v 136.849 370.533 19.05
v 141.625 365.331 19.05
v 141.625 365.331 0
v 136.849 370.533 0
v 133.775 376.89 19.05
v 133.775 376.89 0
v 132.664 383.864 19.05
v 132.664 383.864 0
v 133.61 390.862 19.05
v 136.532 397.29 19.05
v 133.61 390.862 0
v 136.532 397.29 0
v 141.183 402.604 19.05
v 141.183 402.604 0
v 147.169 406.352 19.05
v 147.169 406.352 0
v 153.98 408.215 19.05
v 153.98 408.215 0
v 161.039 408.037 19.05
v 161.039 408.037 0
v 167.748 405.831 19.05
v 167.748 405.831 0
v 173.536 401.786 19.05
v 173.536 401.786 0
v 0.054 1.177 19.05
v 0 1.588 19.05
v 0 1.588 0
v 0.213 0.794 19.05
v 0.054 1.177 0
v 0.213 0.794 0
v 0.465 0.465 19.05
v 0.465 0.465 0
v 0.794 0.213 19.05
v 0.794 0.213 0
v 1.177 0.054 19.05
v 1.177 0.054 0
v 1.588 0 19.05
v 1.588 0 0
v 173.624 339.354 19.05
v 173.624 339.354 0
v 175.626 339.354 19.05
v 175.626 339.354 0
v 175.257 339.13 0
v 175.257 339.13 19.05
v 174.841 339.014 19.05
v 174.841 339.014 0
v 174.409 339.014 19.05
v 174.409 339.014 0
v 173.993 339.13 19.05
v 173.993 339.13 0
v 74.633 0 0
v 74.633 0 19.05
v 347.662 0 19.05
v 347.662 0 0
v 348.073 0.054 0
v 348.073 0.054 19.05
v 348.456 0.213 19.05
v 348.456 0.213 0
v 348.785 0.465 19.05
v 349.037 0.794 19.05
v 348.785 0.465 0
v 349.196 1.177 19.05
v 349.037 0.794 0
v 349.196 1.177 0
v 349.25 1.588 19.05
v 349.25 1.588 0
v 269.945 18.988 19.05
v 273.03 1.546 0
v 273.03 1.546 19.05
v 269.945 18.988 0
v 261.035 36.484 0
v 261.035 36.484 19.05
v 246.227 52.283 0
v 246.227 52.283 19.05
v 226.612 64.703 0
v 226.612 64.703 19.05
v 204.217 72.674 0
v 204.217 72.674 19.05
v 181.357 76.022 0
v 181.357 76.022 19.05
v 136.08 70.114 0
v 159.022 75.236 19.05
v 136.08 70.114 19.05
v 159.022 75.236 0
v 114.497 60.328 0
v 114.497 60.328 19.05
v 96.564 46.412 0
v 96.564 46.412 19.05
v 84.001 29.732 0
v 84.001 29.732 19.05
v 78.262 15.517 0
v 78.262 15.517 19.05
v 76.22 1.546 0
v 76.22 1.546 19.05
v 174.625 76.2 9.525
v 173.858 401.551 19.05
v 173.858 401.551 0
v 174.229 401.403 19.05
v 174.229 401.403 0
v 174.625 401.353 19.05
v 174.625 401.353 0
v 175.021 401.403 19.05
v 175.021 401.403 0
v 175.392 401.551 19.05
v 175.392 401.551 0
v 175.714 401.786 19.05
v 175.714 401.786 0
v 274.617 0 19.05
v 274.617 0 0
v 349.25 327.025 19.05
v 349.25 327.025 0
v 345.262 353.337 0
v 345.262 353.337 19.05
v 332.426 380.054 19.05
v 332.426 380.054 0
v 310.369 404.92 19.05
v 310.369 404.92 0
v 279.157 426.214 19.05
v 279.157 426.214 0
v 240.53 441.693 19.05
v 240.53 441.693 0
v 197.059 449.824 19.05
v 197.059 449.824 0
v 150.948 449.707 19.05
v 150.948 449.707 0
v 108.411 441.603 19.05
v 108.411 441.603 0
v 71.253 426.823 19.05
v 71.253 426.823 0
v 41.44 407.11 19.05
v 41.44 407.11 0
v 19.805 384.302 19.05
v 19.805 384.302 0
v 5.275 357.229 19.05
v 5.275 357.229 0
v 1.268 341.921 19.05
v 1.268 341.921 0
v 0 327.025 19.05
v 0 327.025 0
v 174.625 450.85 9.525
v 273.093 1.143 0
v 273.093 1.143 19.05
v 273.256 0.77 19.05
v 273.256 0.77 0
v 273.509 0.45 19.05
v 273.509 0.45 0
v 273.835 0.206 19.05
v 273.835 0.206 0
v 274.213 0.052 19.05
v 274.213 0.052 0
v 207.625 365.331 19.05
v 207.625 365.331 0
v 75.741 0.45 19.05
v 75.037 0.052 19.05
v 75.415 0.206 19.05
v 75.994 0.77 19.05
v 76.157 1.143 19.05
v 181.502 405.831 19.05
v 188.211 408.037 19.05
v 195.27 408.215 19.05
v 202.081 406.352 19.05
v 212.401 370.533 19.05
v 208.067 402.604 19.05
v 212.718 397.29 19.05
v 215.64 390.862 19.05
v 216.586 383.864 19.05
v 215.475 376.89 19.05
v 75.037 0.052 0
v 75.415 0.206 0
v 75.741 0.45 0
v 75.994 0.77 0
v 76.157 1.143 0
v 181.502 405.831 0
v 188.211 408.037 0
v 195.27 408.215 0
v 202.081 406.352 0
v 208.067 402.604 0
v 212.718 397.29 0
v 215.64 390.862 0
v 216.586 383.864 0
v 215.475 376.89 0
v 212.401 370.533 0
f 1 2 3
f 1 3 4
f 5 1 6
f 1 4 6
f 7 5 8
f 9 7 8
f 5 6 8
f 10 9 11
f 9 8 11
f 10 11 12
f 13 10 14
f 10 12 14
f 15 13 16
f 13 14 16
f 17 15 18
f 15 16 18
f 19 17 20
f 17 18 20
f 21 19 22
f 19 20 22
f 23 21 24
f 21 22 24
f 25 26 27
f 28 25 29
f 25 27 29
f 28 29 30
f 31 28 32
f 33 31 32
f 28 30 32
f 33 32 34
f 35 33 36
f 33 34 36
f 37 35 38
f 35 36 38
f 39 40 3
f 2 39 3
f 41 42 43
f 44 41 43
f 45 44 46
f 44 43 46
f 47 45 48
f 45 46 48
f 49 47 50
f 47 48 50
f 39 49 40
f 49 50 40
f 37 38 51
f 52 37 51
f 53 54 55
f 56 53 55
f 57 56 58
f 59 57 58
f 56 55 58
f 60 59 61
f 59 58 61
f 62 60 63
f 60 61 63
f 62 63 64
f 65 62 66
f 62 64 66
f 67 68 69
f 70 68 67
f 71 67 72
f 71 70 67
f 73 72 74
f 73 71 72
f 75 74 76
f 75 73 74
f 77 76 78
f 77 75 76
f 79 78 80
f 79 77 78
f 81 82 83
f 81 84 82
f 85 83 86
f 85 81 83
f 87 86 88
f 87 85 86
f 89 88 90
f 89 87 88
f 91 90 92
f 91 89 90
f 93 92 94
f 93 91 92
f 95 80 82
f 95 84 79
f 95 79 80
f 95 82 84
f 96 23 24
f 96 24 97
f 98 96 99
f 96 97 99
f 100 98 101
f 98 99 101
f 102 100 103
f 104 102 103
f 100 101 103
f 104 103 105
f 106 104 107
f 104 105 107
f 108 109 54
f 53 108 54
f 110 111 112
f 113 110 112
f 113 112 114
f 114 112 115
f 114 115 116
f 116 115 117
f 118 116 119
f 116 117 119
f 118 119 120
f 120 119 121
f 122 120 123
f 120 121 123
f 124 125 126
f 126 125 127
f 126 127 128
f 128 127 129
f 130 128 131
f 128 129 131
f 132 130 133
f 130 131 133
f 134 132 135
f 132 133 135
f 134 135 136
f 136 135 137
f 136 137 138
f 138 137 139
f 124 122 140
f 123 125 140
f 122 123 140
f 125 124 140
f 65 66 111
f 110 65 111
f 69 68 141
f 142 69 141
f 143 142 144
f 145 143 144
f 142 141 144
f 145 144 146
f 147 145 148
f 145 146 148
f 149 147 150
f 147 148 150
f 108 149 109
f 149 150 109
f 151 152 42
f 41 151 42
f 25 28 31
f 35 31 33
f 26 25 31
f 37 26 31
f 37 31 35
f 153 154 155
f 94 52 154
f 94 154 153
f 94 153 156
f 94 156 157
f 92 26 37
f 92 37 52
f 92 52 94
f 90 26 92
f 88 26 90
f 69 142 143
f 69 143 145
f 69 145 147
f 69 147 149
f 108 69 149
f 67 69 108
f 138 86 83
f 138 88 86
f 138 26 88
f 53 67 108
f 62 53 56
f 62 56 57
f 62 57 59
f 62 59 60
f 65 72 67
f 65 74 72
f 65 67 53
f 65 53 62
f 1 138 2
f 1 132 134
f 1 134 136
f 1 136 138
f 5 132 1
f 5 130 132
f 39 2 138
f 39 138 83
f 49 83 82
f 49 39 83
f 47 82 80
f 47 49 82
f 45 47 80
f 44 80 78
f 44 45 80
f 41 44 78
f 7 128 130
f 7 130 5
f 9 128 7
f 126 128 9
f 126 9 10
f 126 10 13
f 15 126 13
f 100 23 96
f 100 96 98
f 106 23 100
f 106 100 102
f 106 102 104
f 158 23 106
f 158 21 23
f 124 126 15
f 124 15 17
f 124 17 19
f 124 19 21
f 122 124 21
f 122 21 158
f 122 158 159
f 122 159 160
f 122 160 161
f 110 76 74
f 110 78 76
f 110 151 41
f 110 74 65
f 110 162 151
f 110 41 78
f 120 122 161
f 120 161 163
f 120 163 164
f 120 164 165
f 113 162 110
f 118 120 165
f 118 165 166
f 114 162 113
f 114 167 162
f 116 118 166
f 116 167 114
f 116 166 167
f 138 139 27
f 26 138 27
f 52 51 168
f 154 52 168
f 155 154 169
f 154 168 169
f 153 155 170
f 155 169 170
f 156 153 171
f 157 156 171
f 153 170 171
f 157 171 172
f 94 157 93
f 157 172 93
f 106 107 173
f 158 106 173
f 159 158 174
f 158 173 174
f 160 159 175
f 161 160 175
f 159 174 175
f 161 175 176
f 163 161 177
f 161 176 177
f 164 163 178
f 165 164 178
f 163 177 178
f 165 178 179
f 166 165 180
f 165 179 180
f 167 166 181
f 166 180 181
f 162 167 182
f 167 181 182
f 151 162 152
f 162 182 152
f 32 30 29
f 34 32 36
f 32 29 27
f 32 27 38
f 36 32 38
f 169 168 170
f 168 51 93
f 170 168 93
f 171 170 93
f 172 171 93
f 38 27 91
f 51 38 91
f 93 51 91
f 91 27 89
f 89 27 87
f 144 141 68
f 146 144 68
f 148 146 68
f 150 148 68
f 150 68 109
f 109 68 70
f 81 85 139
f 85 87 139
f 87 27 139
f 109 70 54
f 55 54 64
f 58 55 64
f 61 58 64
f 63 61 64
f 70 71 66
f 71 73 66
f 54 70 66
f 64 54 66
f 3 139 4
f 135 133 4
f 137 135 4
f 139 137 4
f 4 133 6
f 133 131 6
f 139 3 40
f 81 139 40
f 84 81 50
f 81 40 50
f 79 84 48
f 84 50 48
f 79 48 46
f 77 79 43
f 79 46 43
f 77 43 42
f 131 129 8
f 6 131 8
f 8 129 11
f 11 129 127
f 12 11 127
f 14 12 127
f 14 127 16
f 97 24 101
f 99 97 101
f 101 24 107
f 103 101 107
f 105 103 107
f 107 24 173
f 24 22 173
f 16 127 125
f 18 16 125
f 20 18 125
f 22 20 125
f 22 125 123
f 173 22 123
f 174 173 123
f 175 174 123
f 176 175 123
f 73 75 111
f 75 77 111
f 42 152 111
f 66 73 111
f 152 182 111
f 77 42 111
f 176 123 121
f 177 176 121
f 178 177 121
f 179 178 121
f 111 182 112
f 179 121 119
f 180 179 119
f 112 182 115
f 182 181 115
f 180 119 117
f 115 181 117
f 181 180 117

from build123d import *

# Parameters (mm, degrees)
F1_DEPTH = 19.05


with BuildPart() as f1:
    # F0 (on Top) → F1 (new body)
    with BuildSketch(Plane.XY):
        with BuildLine():
            ThreePointArc((0, 1.5875), (0.4649679849, 0.4649679849), (1.5875, 0))
            Line((1.5875, 0), (74.6333020513, 0))
            ThreePointArc((74.6333020513, 0), (75.7410306951, 0.4503573081), (76.2202570521, 1.5459058246))
            add(Edge.make_bspline(
                [(273.0297429479, 1.5459058246), (271.0730551496, 76.2), (174.625, 76.2), (78.1769448504, 76.2), (76.2202570521, 1.5459058246)],
                knots=[3.1618815235, 3.1618815235, 3.1618815235, 4.7123889804, 4.7123889804, 6.2628964372, 6.2628964372, 6.2628964372], degree=2, weights=[1, 0.7142434732, 1, 0.7142434732, 1]))
            ThreePointArc((273.0297429479, 1.5459058246), (273.5089693049, 0.4503573081), (274.6166979487, 0))
            Line((274.6166979487, 0), (347.6625, 0))
            ThreePointArc((347.6625, 0), (348.7850320151, 0.4649679849), (349.25, 1.5875))
            Line((349.25, 1.5875), (349.25, 327.025))
            add(Edge.make_bspline(
                [(349.25, 327.025), (349.25, 450.85), (174.625, 450.85), (0, 450.85), (0, 327.025)],
                knots=[3.1415926536, 3.1415926536, 3.1415926536, 4.7123889804, 4.7123889804, 6.2831853072, 6.2831853072, 6.2831853072], degree=2, weights=[1, 0.7071067812, 1, 0.7071067812, 1]))
            Line((0, 327.025), (0, 1.5875))
        make_face()
        with BuildLine():
            ThreePointArc((175.6255398811, 339.3542789737), (174.625, 338.9992870655), (173.6244601189, 339.3542789737))
            Line((173.6244601189, 339.3542789737), (141.6252161387, 365.331000735))
            ThreePointArc((141.6252161387, 365.331000735), (138.6633069983, 400.1174727261), (173.5357626232, 401.7858186217))
            ThreePointArc((173.5357626232, 401.7858186217), (174.625, 401.3531857946), (175.7142373768, 401.7858186217))
            ThreePointArc((175.7142373767, 401.7858186217), (210.5866930017, 400.1174727261), (207.6247838613, 365.331000735))
            Line((207.6247838613, 365.331000735), (175.6255398811, 339.3542789737))
        make_face(mode=Mode.SUBTRACT)
    extrude(amount=F1_DEPTH)


solid = f1.part
